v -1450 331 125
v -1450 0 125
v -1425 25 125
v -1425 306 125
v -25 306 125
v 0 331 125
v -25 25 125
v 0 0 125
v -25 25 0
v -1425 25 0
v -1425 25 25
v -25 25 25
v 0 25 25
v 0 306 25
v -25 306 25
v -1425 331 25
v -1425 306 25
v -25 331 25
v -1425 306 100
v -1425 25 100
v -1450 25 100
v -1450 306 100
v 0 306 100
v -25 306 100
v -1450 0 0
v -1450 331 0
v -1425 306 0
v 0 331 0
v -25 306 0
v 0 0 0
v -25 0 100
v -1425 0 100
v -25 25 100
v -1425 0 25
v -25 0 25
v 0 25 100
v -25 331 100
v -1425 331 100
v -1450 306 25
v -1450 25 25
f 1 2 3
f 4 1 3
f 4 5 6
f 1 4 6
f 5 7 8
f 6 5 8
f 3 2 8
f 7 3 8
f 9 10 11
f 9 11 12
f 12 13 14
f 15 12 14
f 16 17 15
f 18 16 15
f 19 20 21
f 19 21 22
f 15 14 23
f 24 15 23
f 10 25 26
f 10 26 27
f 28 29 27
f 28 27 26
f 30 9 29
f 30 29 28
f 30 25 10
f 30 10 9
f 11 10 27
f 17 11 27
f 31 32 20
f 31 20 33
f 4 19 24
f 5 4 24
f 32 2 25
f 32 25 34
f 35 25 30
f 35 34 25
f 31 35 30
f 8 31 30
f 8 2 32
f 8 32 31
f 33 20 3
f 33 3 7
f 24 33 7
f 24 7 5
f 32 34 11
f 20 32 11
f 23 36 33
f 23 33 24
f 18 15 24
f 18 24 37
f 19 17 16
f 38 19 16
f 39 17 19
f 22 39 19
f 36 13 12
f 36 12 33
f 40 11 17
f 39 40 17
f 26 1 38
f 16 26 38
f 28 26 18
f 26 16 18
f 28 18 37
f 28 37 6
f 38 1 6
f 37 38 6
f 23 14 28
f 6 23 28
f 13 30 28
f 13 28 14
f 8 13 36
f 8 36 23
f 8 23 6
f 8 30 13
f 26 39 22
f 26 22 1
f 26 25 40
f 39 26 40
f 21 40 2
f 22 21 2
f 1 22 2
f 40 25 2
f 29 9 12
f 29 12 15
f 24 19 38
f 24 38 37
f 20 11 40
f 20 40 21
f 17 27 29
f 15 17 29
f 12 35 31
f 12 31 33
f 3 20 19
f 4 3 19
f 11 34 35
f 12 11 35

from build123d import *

# Parameters (mm, degrees)
F0_W     = 1450
F0_H     = 125
F0_W_2   = 1400
F0_H_2   = 75
F1_DEPTH = 331
F2_W     = 1400
F2_H     = 281
F3_DEPTH = 377
F4_W     = 281
F4_H     = 75
F5_DEPTH = 1538


with BuildPart() as f1:
    # F0 (on Front) → F1 (new body)
    with BuildSketch(Plane.XZ):
        with Locations((-725, 62.5)):
            Rectangle(F0_W, F0_H)
        with Locations((-725, 62.5)):
            Rectangle(F0_W_2, F0_H_2, mode=Mode.SUBTRACT)
    extrude(amount=-F1_DEPTH)

    # F2 (on Top) → F3 (cut)
    with BuildSketch(Plane.XY):
        with Locations((-725, 165.5)):
            Rectangle(F2_W, F2_H)
    extrude(amount=F3_DEPTH, mode=Mode.SUBTRACT)

    # F4 (on Right) → F5 (cut)
    with BuildSketch(Plane.YZ):
        with Locations((165.5, 62.5)):
            Rectangle(F4_W, F4_H)
    extrude(amount=-F5_DEPTH, mode=Mode.SUBTRACT)


solid = f1.part
